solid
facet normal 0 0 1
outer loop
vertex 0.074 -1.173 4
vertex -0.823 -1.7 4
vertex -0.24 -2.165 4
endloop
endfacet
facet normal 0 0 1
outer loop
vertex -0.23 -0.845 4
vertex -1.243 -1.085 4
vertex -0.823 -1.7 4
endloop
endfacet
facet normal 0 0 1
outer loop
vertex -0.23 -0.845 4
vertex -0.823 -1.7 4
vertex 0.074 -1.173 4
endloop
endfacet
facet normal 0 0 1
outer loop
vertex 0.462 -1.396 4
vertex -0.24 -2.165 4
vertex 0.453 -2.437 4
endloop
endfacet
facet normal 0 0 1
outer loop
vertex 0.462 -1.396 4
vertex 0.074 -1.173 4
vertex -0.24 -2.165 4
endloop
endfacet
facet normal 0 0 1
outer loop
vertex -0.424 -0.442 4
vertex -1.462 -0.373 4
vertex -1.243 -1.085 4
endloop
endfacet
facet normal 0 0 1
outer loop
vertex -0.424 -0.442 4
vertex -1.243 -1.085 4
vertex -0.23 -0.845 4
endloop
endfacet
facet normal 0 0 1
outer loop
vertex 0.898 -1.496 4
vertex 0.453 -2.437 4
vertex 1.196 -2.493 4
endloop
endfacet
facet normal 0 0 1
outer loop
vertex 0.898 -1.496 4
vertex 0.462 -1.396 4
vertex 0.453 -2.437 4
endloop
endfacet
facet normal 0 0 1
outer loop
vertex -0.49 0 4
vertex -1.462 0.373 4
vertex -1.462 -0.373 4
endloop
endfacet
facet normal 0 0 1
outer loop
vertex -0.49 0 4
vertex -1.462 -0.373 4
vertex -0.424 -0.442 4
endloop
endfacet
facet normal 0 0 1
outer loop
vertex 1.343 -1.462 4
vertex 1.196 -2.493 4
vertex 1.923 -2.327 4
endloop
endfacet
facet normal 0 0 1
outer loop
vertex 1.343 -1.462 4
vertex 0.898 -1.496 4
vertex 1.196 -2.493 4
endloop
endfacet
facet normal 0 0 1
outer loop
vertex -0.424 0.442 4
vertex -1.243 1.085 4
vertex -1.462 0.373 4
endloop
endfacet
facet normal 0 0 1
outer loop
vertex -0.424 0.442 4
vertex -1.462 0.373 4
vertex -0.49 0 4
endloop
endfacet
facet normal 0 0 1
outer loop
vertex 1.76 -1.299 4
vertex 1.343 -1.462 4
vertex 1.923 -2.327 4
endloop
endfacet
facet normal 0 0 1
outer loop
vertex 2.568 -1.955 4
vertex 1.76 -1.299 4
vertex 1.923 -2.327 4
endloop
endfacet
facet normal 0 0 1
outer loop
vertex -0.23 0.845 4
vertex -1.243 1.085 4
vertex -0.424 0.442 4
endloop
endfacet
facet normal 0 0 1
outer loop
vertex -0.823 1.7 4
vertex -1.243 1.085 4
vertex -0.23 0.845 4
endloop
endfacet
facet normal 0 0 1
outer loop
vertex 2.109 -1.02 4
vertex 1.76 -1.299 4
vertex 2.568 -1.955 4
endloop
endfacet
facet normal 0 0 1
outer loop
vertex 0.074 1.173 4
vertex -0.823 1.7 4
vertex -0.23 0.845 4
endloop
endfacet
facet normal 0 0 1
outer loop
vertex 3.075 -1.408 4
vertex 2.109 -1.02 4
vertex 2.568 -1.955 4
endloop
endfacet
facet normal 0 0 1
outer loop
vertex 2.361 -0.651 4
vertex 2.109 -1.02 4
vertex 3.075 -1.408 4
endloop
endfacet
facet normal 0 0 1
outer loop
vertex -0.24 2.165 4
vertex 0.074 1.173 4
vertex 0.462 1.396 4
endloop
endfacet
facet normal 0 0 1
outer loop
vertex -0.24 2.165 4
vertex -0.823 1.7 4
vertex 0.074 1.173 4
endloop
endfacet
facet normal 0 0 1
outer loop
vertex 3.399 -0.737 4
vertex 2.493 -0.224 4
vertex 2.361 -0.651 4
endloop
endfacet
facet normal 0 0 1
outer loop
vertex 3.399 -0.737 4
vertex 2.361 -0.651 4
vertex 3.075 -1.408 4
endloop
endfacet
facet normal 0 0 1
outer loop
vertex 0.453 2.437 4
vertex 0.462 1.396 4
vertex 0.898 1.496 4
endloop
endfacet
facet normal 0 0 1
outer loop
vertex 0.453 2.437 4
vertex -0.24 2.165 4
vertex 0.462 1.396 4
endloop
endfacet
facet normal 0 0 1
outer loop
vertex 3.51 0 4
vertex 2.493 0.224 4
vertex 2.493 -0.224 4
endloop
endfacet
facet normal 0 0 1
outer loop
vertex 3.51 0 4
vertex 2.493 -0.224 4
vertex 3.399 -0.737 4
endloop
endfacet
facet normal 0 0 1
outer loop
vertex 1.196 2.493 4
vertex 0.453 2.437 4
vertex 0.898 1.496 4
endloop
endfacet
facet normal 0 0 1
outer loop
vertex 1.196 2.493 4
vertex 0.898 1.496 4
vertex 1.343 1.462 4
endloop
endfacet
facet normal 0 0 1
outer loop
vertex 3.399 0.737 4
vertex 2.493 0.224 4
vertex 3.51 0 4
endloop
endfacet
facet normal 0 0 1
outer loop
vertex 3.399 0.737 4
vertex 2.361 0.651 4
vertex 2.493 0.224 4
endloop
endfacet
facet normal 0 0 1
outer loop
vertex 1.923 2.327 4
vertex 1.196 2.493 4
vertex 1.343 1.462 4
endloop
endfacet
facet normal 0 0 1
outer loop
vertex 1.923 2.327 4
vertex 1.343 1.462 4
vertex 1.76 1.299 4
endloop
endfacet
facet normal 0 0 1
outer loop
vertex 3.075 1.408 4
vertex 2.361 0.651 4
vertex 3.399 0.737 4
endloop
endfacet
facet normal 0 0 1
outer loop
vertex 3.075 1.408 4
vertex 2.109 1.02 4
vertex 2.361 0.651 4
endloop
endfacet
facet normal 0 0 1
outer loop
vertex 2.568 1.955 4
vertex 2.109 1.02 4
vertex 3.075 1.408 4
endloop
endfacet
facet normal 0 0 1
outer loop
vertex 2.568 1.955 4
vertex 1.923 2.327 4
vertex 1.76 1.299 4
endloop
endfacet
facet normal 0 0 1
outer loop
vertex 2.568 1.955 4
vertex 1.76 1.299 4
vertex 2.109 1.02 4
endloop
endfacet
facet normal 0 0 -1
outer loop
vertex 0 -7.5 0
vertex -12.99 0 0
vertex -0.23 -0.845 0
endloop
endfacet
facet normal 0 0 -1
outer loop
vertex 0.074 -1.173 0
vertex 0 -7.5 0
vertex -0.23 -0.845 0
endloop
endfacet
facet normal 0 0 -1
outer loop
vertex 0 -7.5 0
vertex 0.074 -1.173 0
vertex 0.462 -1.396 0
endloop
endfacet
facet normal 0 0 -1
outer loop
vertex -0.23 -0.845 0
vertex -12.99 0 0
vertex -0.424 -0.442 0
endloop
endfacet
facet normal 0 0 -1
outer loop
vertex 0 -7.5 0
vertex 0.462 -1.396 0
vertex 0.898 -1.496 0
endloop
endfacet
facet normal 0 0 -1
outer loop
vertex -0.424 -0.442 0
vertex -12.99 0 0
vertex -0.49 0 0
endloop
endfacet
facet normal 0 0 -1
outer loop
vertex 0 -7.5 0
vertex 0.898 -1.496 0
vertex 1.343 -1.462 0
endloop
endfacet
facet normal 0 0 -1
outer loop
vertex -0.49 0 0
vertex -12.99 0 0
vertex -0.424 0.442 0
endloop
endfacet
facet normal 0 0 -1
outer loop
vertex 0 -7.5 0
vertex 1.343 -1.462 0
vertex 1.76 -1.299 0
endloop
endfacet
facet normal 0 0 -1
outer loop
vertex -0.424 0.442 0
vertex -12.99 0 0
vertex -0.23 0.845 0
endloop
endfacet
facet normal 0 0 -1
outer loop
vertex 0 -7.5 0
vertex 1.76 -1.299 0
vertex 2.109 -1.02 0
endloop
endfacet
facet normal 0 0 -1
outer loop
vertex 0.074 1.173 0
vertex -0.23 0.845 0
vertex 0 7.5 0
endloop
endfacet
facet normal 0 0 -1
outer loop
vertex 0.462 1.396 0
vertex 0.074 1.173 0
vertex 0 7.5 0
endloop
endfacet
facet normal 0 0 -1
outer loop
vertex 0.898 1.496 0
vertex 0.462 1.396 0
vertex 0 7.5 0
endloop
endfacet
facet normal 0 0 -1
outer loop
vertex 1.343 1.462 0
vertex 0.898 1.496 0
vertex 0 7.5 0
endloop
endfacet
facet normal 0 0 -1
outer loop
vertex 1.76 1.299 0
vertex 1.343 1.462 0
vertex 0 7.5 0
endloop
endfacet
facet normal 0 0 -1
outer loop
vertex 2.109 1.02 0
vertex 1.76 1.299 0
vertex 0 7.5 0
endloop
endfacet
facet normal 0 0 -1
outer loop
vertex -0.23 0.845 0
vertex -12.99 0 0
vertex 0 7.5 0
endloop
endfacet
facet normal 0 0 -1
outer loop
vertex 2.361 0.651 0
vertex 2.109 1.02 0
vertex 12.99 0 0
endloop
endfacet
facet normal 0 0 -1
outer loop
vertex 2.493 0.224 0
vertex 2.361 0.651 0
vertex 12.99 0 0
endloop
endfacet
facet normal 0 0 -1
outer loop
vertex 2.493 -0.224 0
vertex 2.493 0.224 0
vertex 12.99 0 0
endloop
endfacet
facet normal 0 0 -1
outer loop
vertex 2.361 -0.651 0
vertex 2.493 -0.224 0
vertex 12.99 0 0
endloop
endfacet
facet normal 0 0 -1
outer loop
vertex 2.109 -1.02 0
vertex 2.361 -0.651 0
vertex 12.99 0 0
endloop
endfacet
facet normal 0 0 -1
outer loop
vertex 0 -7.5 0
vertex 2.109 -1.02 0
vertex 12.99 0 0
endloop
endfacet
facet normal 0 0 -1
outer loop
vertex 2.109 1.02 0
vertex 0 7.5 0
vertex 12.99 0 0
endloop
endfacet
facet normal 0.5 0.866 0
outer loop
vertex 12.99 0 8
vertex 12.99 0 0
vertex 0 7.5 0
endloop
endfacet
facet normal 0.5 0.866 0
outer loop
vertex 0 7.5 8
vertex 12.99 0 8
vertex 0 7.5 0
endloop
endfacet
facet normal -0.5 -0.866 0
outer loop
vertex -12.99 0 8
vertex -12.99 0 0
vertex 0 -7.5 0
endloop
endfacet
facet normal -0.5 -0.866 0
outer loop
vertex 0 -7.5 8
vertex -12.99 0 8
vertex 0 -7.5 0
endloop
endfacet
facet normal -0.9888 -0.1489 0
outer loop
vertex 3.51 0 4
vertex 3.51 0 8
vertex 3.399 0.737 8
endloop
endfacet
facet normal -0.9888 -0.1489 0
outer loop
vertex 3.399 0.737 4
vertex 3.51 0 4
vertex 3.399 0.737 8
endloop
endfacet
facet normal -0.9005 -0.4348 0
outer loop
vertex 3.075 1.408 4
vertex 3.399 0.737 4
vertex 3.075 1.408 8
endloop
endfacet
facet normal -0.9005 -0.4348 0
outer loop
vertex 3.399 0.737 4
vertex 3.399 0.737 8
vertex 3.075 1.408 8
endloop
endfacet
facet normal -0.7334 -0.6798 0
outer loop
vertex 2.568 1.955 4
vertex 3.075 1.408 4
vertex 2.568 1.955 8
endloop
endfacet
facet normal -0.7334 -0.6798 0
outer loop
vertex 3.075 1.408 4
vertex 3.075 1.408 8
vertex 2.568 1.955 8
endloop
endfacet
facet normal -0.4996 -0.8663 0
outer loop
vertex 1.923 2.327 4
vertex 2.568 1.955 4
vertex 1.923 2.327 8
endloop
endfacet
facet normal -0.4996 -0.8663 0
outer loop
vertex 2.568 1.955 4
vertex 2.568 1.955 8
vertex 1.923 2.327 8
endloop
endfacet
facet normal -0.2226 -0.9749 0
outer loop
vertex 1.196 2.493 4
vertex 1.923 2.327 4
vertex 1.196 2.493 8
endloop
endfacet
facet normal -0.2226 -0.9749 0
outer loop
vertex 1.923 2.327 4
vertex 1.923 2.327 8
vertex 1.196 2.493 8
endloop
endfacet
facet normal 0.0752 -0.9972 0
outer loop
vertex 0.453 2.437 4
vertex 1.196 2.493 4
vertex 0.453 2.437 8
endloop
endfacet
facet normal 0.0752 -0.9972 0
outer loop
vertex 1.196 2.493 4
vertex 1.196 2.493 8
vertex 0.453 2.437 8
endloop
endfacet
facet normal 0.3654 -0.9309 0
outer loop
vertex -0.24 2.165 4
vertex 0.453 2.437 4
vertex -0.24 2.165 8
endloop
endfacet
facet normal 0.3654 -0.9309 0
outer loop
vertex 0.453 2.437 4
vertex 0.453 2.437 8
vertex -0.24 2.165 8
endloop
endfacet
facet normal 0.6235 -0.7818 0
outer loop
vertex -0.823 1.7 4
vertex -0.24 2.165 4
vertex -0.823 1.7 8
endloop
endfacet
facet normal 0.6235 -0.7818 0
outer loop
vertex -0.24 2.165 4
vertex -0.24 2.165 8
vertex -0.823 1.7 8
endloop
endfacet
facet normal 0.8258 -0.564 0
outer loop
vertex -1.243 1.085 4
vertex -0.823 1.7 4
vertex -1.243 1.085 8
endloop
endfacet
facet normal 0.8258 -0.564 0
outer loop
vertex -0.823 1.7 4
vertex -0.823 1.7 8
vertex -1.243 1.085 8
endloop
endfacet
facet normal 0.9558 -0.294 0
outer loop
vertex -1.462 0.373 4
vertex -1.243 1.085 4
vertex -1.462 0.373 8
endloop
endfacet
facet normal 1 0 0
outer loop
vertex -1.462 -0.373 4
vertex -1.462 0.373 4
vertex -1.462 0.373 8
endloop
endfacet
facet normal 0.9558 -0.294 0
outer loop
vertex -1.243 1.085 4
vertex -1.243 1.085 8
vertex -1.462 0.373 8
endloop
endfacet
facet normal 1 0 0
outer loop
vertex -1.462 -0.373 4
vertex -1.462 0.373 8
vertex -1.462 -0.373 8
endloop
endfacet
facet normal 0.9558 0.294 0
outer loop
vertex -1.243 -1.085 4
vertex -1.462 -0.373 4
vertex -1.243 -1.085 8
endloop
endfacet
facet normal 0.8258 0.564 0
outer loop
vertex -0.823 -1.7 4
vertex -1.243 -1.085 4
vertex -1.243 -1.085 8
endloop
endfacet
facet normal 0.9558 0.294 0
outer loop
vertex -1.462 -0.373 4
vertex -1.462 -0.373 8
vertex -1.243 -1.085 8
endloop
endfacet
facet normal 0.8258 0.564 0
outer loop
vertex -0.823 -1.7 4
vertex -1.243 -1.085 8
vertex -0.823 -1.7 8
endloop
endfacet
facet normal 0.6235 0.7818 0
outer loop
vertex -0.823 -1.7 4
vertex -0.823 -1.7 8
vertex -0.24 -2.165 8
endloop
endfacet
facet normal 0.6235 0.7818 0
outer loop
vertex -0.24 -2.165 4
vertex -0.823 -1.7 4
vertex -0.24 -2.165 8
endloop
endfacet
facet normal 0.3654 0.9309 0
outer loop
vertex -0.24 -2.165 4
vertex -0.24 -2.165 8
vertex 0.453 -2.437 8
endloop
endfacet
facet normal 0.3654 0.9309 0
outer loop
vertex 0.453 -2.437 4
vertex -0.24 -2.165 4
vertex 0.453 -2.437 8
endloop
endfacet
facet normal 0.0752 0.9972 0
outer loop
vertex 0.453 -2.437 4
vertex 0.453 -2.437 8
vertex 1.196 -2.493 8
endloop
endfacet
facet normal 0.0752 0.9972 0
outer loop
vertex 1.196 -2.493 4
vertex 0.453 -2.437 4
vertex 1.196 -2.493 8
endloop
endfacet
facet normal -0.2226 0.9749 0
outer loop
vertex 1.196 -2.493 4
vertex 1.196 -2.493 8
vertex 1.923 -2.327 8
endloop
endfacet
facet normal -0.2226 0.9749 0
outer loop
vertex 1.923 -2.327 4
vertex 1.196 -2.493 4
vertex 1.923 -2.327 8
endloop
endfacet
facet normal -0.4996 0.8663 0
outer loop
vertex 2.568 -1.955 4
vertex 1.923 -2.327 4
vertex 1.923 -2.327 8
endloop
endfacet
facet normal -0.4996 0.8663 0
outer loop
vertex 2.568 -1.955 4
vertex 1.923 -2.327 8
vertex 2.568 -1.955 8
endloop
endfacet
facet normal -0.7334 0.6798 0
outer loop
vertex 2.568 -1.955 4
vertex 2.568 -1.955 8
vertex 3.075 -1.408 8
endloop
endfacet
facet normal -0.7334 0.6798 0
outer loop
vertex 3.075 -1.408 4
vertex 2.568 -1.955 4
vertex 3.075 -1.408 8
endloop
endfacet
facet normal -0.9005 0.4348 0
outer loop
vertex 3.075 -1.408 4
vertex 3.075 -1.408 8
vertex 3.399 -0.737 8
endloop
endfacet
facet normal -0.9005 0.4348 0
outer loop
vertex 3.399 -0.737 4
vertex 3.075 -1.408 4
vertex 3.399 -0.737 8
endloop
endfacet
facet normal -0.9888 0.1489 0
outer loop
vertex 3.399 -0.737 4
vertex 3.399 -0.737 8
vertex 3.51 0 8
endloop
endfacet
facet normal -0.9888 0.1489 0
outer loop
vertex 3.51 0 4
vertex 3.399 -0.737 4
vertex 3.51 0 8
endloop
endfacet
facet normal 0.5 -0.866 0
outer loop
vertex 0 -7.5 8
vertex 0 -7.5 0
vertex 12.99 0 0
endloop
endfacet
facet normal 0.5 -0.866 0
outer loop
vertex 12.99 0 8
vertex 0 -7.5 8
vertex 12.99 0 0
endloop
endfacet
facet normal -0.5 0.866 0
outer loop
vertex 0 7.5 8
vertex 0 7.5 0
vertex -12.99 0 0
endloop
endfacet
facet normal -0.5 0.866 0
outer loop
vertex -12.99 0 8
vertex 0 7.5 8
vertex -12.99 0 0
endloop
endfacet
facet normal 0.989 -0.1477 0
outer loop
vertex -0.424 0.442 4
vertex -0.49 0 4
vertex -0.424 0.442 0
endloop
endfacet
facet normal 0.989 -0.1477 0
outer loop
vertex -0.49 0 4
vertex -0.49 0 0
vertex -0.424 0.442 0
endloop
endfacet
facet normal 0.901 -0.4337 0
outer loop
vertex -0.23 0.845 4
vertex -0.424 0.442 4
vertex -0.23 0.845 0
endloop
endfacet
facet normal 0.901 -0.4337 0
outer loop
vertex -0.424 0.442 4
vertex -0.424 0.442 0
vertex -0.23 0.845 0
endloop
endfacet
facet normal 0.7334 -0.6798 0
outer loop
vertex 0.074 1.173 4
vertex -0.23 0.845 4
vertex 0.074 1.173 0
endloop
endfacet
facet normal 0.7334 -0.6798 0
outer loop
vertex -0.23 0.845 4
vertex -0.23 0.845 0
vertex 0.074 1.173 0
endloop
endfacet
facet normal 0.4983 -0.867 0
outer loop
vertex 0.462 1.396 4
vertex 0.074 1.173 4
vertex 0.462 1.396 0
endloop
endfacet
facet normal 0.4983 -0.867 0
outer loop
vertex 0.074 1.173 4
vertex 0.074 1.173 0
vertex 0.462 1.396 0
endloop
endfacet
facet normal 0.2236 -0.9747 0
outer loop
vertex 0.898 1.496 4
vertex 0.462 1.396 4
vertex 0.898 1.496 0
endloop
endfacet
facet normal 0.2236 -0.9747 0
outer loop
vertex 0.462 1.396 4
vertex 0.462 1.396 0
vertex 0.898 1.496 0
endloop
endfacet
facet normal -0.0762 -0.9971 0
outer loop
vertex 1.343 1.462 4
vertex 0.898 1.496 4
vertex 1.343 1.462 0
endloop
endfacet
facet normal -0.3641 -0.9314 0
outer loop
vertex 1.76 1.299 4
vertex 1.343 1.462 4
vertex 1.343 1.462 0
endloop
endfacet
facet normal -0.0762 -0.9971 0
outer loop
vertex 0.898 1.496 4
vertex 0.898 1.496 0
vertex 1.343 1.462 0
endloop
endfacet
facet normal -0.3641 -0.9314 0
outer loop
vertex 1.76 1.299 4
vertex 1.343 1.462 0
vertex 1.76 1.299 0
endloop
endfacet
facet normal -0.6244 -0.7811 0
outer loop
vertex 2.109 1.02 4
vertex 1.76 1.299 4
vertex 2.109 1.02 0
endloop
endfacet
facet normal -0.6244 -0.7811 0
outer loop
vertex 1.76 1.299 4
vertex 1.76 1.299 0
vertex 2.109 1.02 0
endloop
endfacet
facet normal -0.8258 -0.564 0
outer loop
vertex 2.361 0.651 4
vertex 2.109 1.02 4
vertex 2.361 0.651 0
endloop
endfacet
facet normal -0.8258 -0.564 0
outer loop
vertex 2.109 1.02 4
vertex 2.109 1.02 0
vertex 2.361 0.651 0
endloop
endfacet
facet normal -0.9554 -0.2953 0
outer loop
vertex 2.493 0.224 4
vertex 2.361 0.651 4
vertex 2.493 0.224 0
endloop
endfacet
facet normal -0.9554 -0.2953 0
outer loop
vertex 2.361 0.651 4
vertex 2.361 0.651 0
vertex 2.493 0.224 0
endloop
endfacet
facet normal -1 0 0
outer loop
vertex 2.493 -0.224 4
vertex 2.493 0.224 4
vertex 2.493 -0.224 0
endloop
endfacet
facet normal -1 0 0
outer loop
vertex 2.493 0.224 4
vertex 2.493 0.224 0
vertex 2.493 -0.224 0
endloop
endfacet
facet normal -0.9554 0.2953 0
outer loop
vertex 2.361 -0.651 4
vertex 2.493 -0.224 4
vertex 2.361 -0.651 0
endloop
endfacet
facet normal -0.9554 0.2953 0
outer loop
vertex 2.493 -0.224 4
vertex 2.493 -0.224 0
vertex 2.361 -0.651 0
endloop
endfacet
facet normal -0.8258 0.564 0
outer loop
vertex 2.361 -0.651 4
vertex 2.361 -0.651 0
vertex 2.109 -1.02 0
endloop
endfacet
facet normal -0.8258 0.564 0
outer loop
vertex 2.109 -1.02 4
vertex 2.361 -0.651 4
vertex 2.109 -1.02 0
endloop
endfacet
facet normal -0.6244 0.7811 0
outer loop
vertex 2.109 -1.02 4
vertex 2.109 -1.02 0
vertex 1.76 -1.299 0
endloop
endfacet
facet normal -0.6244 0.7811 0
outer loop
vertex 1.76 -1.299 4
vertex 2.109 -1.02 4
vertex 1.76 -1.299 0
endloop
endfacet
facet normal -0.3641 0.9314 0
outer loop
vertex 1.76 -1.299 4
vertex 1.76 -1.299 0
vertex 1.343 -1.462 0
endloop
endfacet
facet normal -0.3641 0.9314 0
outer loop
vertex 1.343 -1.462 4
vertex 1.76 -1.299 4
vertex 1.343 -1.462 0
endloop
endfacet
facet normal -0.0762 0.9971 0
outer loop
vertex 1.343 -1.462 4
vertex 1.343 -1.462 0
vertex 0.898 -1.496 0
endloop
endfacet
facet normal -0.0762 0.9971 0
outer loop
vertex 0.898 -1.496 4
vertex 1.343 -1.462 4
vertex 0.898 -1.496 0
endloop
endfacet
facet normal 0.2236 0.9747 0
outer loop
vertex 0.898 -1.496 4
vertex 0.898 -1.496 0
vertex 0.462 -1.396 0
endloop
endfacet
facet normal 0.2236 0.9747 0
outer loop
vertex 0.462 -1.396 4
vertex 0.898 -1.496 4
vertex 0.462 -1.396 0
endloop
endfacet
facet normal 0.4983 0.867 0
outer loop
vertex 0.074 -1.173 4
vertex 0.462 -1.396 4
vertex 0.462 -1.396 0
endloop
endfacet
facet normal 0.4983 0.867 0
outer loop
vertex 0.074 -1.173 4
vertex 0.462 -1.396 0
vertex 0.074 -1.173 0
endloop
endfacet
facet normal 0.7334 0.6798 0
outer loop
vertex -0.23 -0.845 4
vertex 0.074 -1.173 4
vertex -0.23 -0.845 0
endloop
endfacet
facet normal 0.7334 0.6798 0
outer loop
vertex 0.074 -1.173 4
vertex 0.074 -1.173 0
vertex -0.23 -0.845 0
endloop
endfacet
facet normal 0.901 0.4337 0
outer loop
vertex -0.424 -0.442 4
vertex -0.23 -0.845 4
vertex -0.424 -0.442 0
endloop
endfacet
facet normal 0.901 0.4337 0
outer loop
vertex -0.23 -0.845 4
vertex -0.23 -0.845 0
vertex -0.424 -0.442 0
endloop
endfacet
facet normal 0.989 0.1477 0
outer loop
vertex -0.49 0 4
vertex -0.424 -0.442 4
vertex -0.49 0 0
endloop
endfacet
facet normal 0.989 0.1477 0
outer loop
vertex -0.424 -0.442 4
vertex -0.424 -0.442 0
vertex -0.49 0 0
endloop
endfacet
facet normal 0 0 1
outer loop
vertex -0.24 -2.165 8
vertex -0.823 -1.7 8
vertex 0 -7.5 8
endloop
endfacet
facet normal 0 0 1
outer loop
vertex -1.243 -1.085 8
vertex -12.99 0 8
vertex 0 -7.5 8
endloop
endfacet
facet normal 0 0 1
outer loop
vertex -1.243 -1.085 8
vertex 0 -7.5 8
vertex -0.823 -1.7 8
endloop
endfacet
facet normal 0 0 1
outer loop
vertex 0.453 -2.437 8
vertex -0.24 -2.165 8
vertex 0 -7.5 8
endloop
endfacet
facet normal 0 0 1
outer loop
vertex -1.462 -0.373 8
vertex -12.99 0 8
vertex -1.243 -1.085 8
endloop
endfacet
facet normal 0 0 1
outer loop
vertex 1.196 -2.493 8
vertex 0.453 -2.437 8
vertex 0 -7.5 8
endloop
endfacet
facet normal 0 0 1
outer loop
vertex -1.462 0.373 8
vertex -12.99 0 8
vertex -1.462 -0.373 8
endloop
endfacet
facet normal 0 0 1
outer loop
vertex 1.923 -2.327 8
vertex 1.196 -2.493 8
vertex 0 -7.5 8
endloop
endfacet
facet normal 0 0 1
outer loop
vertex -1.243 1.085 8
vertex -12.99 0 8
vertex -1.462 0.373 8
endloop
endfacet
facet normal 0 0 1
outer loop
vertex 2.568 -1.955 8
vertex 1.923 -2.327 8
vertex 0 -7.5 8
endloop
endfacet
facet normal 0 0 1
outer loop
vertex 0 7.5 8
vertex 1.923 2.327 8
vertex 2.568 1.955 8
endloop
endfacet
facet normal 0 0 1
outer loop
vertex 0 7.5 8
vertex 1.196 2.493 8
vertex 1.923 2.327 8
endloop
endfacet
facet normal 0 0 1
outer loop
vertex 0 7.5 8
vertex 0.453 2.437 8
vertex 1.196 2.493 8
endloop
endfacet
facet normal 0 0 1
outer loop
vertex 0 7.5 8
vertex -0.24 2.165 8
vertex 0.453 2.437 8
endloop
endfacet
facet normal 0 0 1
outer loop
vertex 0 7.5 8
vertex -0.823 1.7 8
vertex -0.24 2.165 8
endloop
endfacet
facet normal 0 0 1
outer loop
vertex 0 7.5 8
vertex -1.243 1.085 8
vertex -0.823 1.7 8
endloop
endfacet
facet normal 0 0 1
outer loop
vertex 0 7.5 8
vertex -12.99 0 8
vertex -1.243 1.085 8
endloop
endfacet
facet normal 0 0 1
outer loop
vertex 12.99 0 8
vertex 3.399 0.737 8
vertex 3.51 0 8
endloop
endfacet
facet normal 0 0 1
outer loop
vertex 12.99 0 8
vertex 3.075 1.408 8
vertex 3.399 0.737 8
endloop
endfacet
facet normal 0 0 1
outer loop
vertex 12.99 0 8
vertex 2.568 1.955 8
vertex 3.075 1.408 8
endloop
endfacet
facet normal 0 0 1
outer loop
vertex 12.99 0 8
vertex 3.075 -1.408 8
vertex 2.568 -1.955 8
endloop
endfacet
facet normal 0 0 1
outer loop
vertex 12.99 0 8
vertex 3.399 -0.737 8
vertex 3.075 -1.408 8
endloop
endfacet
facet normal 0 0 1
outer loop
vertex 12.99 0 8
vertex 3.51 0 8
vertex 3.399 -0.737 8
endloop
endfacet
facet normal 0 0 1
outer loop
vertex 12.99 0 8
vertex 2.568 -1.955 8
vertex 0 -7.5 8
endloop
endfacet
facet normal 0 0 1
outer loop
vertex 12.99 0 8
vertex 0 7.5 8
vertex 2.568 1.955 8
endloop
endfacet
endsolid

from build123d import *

# Parameters (mm, degrees)
EXTRUDE_1_DEPTH           = 8
HOLE_WIZARD_3_D           = 3
HOLE_WIZARD_3_DEPTH       = 9
HOLE_WIZARD_3_CBORE_D     = 5
HOLE_WIZARD_3_CBORE_DEPTH = 4


with BuildPart() as part:
    # 草图1 → 凸台-拉伸1 (new body)
    with BuildSketch(Plane.XY):
        Polygon((0, 7.5), (-12.990381057, 0), (0, -7.5), (12.990381057, 0), align=None)
    extrude(amount=EXTRUDE_1_DEPTH)

    # 孔3
    with Locations(Plane(origin=(1.009618943, 0, 8), x_dir=(1, 0, 0), z_dir=(0, 0, 1))):
        with Locations((0, 0)):
            CounterBoreHole(HOLE_WIZARD_3_D / 2, HOLE_WIZARD_3_CBORE_D / 2, HOLE_WIZARD_3_CBORE_DEPTH, depth=HOLE_WIZARD_3_DEPTH)


solid = part.part
